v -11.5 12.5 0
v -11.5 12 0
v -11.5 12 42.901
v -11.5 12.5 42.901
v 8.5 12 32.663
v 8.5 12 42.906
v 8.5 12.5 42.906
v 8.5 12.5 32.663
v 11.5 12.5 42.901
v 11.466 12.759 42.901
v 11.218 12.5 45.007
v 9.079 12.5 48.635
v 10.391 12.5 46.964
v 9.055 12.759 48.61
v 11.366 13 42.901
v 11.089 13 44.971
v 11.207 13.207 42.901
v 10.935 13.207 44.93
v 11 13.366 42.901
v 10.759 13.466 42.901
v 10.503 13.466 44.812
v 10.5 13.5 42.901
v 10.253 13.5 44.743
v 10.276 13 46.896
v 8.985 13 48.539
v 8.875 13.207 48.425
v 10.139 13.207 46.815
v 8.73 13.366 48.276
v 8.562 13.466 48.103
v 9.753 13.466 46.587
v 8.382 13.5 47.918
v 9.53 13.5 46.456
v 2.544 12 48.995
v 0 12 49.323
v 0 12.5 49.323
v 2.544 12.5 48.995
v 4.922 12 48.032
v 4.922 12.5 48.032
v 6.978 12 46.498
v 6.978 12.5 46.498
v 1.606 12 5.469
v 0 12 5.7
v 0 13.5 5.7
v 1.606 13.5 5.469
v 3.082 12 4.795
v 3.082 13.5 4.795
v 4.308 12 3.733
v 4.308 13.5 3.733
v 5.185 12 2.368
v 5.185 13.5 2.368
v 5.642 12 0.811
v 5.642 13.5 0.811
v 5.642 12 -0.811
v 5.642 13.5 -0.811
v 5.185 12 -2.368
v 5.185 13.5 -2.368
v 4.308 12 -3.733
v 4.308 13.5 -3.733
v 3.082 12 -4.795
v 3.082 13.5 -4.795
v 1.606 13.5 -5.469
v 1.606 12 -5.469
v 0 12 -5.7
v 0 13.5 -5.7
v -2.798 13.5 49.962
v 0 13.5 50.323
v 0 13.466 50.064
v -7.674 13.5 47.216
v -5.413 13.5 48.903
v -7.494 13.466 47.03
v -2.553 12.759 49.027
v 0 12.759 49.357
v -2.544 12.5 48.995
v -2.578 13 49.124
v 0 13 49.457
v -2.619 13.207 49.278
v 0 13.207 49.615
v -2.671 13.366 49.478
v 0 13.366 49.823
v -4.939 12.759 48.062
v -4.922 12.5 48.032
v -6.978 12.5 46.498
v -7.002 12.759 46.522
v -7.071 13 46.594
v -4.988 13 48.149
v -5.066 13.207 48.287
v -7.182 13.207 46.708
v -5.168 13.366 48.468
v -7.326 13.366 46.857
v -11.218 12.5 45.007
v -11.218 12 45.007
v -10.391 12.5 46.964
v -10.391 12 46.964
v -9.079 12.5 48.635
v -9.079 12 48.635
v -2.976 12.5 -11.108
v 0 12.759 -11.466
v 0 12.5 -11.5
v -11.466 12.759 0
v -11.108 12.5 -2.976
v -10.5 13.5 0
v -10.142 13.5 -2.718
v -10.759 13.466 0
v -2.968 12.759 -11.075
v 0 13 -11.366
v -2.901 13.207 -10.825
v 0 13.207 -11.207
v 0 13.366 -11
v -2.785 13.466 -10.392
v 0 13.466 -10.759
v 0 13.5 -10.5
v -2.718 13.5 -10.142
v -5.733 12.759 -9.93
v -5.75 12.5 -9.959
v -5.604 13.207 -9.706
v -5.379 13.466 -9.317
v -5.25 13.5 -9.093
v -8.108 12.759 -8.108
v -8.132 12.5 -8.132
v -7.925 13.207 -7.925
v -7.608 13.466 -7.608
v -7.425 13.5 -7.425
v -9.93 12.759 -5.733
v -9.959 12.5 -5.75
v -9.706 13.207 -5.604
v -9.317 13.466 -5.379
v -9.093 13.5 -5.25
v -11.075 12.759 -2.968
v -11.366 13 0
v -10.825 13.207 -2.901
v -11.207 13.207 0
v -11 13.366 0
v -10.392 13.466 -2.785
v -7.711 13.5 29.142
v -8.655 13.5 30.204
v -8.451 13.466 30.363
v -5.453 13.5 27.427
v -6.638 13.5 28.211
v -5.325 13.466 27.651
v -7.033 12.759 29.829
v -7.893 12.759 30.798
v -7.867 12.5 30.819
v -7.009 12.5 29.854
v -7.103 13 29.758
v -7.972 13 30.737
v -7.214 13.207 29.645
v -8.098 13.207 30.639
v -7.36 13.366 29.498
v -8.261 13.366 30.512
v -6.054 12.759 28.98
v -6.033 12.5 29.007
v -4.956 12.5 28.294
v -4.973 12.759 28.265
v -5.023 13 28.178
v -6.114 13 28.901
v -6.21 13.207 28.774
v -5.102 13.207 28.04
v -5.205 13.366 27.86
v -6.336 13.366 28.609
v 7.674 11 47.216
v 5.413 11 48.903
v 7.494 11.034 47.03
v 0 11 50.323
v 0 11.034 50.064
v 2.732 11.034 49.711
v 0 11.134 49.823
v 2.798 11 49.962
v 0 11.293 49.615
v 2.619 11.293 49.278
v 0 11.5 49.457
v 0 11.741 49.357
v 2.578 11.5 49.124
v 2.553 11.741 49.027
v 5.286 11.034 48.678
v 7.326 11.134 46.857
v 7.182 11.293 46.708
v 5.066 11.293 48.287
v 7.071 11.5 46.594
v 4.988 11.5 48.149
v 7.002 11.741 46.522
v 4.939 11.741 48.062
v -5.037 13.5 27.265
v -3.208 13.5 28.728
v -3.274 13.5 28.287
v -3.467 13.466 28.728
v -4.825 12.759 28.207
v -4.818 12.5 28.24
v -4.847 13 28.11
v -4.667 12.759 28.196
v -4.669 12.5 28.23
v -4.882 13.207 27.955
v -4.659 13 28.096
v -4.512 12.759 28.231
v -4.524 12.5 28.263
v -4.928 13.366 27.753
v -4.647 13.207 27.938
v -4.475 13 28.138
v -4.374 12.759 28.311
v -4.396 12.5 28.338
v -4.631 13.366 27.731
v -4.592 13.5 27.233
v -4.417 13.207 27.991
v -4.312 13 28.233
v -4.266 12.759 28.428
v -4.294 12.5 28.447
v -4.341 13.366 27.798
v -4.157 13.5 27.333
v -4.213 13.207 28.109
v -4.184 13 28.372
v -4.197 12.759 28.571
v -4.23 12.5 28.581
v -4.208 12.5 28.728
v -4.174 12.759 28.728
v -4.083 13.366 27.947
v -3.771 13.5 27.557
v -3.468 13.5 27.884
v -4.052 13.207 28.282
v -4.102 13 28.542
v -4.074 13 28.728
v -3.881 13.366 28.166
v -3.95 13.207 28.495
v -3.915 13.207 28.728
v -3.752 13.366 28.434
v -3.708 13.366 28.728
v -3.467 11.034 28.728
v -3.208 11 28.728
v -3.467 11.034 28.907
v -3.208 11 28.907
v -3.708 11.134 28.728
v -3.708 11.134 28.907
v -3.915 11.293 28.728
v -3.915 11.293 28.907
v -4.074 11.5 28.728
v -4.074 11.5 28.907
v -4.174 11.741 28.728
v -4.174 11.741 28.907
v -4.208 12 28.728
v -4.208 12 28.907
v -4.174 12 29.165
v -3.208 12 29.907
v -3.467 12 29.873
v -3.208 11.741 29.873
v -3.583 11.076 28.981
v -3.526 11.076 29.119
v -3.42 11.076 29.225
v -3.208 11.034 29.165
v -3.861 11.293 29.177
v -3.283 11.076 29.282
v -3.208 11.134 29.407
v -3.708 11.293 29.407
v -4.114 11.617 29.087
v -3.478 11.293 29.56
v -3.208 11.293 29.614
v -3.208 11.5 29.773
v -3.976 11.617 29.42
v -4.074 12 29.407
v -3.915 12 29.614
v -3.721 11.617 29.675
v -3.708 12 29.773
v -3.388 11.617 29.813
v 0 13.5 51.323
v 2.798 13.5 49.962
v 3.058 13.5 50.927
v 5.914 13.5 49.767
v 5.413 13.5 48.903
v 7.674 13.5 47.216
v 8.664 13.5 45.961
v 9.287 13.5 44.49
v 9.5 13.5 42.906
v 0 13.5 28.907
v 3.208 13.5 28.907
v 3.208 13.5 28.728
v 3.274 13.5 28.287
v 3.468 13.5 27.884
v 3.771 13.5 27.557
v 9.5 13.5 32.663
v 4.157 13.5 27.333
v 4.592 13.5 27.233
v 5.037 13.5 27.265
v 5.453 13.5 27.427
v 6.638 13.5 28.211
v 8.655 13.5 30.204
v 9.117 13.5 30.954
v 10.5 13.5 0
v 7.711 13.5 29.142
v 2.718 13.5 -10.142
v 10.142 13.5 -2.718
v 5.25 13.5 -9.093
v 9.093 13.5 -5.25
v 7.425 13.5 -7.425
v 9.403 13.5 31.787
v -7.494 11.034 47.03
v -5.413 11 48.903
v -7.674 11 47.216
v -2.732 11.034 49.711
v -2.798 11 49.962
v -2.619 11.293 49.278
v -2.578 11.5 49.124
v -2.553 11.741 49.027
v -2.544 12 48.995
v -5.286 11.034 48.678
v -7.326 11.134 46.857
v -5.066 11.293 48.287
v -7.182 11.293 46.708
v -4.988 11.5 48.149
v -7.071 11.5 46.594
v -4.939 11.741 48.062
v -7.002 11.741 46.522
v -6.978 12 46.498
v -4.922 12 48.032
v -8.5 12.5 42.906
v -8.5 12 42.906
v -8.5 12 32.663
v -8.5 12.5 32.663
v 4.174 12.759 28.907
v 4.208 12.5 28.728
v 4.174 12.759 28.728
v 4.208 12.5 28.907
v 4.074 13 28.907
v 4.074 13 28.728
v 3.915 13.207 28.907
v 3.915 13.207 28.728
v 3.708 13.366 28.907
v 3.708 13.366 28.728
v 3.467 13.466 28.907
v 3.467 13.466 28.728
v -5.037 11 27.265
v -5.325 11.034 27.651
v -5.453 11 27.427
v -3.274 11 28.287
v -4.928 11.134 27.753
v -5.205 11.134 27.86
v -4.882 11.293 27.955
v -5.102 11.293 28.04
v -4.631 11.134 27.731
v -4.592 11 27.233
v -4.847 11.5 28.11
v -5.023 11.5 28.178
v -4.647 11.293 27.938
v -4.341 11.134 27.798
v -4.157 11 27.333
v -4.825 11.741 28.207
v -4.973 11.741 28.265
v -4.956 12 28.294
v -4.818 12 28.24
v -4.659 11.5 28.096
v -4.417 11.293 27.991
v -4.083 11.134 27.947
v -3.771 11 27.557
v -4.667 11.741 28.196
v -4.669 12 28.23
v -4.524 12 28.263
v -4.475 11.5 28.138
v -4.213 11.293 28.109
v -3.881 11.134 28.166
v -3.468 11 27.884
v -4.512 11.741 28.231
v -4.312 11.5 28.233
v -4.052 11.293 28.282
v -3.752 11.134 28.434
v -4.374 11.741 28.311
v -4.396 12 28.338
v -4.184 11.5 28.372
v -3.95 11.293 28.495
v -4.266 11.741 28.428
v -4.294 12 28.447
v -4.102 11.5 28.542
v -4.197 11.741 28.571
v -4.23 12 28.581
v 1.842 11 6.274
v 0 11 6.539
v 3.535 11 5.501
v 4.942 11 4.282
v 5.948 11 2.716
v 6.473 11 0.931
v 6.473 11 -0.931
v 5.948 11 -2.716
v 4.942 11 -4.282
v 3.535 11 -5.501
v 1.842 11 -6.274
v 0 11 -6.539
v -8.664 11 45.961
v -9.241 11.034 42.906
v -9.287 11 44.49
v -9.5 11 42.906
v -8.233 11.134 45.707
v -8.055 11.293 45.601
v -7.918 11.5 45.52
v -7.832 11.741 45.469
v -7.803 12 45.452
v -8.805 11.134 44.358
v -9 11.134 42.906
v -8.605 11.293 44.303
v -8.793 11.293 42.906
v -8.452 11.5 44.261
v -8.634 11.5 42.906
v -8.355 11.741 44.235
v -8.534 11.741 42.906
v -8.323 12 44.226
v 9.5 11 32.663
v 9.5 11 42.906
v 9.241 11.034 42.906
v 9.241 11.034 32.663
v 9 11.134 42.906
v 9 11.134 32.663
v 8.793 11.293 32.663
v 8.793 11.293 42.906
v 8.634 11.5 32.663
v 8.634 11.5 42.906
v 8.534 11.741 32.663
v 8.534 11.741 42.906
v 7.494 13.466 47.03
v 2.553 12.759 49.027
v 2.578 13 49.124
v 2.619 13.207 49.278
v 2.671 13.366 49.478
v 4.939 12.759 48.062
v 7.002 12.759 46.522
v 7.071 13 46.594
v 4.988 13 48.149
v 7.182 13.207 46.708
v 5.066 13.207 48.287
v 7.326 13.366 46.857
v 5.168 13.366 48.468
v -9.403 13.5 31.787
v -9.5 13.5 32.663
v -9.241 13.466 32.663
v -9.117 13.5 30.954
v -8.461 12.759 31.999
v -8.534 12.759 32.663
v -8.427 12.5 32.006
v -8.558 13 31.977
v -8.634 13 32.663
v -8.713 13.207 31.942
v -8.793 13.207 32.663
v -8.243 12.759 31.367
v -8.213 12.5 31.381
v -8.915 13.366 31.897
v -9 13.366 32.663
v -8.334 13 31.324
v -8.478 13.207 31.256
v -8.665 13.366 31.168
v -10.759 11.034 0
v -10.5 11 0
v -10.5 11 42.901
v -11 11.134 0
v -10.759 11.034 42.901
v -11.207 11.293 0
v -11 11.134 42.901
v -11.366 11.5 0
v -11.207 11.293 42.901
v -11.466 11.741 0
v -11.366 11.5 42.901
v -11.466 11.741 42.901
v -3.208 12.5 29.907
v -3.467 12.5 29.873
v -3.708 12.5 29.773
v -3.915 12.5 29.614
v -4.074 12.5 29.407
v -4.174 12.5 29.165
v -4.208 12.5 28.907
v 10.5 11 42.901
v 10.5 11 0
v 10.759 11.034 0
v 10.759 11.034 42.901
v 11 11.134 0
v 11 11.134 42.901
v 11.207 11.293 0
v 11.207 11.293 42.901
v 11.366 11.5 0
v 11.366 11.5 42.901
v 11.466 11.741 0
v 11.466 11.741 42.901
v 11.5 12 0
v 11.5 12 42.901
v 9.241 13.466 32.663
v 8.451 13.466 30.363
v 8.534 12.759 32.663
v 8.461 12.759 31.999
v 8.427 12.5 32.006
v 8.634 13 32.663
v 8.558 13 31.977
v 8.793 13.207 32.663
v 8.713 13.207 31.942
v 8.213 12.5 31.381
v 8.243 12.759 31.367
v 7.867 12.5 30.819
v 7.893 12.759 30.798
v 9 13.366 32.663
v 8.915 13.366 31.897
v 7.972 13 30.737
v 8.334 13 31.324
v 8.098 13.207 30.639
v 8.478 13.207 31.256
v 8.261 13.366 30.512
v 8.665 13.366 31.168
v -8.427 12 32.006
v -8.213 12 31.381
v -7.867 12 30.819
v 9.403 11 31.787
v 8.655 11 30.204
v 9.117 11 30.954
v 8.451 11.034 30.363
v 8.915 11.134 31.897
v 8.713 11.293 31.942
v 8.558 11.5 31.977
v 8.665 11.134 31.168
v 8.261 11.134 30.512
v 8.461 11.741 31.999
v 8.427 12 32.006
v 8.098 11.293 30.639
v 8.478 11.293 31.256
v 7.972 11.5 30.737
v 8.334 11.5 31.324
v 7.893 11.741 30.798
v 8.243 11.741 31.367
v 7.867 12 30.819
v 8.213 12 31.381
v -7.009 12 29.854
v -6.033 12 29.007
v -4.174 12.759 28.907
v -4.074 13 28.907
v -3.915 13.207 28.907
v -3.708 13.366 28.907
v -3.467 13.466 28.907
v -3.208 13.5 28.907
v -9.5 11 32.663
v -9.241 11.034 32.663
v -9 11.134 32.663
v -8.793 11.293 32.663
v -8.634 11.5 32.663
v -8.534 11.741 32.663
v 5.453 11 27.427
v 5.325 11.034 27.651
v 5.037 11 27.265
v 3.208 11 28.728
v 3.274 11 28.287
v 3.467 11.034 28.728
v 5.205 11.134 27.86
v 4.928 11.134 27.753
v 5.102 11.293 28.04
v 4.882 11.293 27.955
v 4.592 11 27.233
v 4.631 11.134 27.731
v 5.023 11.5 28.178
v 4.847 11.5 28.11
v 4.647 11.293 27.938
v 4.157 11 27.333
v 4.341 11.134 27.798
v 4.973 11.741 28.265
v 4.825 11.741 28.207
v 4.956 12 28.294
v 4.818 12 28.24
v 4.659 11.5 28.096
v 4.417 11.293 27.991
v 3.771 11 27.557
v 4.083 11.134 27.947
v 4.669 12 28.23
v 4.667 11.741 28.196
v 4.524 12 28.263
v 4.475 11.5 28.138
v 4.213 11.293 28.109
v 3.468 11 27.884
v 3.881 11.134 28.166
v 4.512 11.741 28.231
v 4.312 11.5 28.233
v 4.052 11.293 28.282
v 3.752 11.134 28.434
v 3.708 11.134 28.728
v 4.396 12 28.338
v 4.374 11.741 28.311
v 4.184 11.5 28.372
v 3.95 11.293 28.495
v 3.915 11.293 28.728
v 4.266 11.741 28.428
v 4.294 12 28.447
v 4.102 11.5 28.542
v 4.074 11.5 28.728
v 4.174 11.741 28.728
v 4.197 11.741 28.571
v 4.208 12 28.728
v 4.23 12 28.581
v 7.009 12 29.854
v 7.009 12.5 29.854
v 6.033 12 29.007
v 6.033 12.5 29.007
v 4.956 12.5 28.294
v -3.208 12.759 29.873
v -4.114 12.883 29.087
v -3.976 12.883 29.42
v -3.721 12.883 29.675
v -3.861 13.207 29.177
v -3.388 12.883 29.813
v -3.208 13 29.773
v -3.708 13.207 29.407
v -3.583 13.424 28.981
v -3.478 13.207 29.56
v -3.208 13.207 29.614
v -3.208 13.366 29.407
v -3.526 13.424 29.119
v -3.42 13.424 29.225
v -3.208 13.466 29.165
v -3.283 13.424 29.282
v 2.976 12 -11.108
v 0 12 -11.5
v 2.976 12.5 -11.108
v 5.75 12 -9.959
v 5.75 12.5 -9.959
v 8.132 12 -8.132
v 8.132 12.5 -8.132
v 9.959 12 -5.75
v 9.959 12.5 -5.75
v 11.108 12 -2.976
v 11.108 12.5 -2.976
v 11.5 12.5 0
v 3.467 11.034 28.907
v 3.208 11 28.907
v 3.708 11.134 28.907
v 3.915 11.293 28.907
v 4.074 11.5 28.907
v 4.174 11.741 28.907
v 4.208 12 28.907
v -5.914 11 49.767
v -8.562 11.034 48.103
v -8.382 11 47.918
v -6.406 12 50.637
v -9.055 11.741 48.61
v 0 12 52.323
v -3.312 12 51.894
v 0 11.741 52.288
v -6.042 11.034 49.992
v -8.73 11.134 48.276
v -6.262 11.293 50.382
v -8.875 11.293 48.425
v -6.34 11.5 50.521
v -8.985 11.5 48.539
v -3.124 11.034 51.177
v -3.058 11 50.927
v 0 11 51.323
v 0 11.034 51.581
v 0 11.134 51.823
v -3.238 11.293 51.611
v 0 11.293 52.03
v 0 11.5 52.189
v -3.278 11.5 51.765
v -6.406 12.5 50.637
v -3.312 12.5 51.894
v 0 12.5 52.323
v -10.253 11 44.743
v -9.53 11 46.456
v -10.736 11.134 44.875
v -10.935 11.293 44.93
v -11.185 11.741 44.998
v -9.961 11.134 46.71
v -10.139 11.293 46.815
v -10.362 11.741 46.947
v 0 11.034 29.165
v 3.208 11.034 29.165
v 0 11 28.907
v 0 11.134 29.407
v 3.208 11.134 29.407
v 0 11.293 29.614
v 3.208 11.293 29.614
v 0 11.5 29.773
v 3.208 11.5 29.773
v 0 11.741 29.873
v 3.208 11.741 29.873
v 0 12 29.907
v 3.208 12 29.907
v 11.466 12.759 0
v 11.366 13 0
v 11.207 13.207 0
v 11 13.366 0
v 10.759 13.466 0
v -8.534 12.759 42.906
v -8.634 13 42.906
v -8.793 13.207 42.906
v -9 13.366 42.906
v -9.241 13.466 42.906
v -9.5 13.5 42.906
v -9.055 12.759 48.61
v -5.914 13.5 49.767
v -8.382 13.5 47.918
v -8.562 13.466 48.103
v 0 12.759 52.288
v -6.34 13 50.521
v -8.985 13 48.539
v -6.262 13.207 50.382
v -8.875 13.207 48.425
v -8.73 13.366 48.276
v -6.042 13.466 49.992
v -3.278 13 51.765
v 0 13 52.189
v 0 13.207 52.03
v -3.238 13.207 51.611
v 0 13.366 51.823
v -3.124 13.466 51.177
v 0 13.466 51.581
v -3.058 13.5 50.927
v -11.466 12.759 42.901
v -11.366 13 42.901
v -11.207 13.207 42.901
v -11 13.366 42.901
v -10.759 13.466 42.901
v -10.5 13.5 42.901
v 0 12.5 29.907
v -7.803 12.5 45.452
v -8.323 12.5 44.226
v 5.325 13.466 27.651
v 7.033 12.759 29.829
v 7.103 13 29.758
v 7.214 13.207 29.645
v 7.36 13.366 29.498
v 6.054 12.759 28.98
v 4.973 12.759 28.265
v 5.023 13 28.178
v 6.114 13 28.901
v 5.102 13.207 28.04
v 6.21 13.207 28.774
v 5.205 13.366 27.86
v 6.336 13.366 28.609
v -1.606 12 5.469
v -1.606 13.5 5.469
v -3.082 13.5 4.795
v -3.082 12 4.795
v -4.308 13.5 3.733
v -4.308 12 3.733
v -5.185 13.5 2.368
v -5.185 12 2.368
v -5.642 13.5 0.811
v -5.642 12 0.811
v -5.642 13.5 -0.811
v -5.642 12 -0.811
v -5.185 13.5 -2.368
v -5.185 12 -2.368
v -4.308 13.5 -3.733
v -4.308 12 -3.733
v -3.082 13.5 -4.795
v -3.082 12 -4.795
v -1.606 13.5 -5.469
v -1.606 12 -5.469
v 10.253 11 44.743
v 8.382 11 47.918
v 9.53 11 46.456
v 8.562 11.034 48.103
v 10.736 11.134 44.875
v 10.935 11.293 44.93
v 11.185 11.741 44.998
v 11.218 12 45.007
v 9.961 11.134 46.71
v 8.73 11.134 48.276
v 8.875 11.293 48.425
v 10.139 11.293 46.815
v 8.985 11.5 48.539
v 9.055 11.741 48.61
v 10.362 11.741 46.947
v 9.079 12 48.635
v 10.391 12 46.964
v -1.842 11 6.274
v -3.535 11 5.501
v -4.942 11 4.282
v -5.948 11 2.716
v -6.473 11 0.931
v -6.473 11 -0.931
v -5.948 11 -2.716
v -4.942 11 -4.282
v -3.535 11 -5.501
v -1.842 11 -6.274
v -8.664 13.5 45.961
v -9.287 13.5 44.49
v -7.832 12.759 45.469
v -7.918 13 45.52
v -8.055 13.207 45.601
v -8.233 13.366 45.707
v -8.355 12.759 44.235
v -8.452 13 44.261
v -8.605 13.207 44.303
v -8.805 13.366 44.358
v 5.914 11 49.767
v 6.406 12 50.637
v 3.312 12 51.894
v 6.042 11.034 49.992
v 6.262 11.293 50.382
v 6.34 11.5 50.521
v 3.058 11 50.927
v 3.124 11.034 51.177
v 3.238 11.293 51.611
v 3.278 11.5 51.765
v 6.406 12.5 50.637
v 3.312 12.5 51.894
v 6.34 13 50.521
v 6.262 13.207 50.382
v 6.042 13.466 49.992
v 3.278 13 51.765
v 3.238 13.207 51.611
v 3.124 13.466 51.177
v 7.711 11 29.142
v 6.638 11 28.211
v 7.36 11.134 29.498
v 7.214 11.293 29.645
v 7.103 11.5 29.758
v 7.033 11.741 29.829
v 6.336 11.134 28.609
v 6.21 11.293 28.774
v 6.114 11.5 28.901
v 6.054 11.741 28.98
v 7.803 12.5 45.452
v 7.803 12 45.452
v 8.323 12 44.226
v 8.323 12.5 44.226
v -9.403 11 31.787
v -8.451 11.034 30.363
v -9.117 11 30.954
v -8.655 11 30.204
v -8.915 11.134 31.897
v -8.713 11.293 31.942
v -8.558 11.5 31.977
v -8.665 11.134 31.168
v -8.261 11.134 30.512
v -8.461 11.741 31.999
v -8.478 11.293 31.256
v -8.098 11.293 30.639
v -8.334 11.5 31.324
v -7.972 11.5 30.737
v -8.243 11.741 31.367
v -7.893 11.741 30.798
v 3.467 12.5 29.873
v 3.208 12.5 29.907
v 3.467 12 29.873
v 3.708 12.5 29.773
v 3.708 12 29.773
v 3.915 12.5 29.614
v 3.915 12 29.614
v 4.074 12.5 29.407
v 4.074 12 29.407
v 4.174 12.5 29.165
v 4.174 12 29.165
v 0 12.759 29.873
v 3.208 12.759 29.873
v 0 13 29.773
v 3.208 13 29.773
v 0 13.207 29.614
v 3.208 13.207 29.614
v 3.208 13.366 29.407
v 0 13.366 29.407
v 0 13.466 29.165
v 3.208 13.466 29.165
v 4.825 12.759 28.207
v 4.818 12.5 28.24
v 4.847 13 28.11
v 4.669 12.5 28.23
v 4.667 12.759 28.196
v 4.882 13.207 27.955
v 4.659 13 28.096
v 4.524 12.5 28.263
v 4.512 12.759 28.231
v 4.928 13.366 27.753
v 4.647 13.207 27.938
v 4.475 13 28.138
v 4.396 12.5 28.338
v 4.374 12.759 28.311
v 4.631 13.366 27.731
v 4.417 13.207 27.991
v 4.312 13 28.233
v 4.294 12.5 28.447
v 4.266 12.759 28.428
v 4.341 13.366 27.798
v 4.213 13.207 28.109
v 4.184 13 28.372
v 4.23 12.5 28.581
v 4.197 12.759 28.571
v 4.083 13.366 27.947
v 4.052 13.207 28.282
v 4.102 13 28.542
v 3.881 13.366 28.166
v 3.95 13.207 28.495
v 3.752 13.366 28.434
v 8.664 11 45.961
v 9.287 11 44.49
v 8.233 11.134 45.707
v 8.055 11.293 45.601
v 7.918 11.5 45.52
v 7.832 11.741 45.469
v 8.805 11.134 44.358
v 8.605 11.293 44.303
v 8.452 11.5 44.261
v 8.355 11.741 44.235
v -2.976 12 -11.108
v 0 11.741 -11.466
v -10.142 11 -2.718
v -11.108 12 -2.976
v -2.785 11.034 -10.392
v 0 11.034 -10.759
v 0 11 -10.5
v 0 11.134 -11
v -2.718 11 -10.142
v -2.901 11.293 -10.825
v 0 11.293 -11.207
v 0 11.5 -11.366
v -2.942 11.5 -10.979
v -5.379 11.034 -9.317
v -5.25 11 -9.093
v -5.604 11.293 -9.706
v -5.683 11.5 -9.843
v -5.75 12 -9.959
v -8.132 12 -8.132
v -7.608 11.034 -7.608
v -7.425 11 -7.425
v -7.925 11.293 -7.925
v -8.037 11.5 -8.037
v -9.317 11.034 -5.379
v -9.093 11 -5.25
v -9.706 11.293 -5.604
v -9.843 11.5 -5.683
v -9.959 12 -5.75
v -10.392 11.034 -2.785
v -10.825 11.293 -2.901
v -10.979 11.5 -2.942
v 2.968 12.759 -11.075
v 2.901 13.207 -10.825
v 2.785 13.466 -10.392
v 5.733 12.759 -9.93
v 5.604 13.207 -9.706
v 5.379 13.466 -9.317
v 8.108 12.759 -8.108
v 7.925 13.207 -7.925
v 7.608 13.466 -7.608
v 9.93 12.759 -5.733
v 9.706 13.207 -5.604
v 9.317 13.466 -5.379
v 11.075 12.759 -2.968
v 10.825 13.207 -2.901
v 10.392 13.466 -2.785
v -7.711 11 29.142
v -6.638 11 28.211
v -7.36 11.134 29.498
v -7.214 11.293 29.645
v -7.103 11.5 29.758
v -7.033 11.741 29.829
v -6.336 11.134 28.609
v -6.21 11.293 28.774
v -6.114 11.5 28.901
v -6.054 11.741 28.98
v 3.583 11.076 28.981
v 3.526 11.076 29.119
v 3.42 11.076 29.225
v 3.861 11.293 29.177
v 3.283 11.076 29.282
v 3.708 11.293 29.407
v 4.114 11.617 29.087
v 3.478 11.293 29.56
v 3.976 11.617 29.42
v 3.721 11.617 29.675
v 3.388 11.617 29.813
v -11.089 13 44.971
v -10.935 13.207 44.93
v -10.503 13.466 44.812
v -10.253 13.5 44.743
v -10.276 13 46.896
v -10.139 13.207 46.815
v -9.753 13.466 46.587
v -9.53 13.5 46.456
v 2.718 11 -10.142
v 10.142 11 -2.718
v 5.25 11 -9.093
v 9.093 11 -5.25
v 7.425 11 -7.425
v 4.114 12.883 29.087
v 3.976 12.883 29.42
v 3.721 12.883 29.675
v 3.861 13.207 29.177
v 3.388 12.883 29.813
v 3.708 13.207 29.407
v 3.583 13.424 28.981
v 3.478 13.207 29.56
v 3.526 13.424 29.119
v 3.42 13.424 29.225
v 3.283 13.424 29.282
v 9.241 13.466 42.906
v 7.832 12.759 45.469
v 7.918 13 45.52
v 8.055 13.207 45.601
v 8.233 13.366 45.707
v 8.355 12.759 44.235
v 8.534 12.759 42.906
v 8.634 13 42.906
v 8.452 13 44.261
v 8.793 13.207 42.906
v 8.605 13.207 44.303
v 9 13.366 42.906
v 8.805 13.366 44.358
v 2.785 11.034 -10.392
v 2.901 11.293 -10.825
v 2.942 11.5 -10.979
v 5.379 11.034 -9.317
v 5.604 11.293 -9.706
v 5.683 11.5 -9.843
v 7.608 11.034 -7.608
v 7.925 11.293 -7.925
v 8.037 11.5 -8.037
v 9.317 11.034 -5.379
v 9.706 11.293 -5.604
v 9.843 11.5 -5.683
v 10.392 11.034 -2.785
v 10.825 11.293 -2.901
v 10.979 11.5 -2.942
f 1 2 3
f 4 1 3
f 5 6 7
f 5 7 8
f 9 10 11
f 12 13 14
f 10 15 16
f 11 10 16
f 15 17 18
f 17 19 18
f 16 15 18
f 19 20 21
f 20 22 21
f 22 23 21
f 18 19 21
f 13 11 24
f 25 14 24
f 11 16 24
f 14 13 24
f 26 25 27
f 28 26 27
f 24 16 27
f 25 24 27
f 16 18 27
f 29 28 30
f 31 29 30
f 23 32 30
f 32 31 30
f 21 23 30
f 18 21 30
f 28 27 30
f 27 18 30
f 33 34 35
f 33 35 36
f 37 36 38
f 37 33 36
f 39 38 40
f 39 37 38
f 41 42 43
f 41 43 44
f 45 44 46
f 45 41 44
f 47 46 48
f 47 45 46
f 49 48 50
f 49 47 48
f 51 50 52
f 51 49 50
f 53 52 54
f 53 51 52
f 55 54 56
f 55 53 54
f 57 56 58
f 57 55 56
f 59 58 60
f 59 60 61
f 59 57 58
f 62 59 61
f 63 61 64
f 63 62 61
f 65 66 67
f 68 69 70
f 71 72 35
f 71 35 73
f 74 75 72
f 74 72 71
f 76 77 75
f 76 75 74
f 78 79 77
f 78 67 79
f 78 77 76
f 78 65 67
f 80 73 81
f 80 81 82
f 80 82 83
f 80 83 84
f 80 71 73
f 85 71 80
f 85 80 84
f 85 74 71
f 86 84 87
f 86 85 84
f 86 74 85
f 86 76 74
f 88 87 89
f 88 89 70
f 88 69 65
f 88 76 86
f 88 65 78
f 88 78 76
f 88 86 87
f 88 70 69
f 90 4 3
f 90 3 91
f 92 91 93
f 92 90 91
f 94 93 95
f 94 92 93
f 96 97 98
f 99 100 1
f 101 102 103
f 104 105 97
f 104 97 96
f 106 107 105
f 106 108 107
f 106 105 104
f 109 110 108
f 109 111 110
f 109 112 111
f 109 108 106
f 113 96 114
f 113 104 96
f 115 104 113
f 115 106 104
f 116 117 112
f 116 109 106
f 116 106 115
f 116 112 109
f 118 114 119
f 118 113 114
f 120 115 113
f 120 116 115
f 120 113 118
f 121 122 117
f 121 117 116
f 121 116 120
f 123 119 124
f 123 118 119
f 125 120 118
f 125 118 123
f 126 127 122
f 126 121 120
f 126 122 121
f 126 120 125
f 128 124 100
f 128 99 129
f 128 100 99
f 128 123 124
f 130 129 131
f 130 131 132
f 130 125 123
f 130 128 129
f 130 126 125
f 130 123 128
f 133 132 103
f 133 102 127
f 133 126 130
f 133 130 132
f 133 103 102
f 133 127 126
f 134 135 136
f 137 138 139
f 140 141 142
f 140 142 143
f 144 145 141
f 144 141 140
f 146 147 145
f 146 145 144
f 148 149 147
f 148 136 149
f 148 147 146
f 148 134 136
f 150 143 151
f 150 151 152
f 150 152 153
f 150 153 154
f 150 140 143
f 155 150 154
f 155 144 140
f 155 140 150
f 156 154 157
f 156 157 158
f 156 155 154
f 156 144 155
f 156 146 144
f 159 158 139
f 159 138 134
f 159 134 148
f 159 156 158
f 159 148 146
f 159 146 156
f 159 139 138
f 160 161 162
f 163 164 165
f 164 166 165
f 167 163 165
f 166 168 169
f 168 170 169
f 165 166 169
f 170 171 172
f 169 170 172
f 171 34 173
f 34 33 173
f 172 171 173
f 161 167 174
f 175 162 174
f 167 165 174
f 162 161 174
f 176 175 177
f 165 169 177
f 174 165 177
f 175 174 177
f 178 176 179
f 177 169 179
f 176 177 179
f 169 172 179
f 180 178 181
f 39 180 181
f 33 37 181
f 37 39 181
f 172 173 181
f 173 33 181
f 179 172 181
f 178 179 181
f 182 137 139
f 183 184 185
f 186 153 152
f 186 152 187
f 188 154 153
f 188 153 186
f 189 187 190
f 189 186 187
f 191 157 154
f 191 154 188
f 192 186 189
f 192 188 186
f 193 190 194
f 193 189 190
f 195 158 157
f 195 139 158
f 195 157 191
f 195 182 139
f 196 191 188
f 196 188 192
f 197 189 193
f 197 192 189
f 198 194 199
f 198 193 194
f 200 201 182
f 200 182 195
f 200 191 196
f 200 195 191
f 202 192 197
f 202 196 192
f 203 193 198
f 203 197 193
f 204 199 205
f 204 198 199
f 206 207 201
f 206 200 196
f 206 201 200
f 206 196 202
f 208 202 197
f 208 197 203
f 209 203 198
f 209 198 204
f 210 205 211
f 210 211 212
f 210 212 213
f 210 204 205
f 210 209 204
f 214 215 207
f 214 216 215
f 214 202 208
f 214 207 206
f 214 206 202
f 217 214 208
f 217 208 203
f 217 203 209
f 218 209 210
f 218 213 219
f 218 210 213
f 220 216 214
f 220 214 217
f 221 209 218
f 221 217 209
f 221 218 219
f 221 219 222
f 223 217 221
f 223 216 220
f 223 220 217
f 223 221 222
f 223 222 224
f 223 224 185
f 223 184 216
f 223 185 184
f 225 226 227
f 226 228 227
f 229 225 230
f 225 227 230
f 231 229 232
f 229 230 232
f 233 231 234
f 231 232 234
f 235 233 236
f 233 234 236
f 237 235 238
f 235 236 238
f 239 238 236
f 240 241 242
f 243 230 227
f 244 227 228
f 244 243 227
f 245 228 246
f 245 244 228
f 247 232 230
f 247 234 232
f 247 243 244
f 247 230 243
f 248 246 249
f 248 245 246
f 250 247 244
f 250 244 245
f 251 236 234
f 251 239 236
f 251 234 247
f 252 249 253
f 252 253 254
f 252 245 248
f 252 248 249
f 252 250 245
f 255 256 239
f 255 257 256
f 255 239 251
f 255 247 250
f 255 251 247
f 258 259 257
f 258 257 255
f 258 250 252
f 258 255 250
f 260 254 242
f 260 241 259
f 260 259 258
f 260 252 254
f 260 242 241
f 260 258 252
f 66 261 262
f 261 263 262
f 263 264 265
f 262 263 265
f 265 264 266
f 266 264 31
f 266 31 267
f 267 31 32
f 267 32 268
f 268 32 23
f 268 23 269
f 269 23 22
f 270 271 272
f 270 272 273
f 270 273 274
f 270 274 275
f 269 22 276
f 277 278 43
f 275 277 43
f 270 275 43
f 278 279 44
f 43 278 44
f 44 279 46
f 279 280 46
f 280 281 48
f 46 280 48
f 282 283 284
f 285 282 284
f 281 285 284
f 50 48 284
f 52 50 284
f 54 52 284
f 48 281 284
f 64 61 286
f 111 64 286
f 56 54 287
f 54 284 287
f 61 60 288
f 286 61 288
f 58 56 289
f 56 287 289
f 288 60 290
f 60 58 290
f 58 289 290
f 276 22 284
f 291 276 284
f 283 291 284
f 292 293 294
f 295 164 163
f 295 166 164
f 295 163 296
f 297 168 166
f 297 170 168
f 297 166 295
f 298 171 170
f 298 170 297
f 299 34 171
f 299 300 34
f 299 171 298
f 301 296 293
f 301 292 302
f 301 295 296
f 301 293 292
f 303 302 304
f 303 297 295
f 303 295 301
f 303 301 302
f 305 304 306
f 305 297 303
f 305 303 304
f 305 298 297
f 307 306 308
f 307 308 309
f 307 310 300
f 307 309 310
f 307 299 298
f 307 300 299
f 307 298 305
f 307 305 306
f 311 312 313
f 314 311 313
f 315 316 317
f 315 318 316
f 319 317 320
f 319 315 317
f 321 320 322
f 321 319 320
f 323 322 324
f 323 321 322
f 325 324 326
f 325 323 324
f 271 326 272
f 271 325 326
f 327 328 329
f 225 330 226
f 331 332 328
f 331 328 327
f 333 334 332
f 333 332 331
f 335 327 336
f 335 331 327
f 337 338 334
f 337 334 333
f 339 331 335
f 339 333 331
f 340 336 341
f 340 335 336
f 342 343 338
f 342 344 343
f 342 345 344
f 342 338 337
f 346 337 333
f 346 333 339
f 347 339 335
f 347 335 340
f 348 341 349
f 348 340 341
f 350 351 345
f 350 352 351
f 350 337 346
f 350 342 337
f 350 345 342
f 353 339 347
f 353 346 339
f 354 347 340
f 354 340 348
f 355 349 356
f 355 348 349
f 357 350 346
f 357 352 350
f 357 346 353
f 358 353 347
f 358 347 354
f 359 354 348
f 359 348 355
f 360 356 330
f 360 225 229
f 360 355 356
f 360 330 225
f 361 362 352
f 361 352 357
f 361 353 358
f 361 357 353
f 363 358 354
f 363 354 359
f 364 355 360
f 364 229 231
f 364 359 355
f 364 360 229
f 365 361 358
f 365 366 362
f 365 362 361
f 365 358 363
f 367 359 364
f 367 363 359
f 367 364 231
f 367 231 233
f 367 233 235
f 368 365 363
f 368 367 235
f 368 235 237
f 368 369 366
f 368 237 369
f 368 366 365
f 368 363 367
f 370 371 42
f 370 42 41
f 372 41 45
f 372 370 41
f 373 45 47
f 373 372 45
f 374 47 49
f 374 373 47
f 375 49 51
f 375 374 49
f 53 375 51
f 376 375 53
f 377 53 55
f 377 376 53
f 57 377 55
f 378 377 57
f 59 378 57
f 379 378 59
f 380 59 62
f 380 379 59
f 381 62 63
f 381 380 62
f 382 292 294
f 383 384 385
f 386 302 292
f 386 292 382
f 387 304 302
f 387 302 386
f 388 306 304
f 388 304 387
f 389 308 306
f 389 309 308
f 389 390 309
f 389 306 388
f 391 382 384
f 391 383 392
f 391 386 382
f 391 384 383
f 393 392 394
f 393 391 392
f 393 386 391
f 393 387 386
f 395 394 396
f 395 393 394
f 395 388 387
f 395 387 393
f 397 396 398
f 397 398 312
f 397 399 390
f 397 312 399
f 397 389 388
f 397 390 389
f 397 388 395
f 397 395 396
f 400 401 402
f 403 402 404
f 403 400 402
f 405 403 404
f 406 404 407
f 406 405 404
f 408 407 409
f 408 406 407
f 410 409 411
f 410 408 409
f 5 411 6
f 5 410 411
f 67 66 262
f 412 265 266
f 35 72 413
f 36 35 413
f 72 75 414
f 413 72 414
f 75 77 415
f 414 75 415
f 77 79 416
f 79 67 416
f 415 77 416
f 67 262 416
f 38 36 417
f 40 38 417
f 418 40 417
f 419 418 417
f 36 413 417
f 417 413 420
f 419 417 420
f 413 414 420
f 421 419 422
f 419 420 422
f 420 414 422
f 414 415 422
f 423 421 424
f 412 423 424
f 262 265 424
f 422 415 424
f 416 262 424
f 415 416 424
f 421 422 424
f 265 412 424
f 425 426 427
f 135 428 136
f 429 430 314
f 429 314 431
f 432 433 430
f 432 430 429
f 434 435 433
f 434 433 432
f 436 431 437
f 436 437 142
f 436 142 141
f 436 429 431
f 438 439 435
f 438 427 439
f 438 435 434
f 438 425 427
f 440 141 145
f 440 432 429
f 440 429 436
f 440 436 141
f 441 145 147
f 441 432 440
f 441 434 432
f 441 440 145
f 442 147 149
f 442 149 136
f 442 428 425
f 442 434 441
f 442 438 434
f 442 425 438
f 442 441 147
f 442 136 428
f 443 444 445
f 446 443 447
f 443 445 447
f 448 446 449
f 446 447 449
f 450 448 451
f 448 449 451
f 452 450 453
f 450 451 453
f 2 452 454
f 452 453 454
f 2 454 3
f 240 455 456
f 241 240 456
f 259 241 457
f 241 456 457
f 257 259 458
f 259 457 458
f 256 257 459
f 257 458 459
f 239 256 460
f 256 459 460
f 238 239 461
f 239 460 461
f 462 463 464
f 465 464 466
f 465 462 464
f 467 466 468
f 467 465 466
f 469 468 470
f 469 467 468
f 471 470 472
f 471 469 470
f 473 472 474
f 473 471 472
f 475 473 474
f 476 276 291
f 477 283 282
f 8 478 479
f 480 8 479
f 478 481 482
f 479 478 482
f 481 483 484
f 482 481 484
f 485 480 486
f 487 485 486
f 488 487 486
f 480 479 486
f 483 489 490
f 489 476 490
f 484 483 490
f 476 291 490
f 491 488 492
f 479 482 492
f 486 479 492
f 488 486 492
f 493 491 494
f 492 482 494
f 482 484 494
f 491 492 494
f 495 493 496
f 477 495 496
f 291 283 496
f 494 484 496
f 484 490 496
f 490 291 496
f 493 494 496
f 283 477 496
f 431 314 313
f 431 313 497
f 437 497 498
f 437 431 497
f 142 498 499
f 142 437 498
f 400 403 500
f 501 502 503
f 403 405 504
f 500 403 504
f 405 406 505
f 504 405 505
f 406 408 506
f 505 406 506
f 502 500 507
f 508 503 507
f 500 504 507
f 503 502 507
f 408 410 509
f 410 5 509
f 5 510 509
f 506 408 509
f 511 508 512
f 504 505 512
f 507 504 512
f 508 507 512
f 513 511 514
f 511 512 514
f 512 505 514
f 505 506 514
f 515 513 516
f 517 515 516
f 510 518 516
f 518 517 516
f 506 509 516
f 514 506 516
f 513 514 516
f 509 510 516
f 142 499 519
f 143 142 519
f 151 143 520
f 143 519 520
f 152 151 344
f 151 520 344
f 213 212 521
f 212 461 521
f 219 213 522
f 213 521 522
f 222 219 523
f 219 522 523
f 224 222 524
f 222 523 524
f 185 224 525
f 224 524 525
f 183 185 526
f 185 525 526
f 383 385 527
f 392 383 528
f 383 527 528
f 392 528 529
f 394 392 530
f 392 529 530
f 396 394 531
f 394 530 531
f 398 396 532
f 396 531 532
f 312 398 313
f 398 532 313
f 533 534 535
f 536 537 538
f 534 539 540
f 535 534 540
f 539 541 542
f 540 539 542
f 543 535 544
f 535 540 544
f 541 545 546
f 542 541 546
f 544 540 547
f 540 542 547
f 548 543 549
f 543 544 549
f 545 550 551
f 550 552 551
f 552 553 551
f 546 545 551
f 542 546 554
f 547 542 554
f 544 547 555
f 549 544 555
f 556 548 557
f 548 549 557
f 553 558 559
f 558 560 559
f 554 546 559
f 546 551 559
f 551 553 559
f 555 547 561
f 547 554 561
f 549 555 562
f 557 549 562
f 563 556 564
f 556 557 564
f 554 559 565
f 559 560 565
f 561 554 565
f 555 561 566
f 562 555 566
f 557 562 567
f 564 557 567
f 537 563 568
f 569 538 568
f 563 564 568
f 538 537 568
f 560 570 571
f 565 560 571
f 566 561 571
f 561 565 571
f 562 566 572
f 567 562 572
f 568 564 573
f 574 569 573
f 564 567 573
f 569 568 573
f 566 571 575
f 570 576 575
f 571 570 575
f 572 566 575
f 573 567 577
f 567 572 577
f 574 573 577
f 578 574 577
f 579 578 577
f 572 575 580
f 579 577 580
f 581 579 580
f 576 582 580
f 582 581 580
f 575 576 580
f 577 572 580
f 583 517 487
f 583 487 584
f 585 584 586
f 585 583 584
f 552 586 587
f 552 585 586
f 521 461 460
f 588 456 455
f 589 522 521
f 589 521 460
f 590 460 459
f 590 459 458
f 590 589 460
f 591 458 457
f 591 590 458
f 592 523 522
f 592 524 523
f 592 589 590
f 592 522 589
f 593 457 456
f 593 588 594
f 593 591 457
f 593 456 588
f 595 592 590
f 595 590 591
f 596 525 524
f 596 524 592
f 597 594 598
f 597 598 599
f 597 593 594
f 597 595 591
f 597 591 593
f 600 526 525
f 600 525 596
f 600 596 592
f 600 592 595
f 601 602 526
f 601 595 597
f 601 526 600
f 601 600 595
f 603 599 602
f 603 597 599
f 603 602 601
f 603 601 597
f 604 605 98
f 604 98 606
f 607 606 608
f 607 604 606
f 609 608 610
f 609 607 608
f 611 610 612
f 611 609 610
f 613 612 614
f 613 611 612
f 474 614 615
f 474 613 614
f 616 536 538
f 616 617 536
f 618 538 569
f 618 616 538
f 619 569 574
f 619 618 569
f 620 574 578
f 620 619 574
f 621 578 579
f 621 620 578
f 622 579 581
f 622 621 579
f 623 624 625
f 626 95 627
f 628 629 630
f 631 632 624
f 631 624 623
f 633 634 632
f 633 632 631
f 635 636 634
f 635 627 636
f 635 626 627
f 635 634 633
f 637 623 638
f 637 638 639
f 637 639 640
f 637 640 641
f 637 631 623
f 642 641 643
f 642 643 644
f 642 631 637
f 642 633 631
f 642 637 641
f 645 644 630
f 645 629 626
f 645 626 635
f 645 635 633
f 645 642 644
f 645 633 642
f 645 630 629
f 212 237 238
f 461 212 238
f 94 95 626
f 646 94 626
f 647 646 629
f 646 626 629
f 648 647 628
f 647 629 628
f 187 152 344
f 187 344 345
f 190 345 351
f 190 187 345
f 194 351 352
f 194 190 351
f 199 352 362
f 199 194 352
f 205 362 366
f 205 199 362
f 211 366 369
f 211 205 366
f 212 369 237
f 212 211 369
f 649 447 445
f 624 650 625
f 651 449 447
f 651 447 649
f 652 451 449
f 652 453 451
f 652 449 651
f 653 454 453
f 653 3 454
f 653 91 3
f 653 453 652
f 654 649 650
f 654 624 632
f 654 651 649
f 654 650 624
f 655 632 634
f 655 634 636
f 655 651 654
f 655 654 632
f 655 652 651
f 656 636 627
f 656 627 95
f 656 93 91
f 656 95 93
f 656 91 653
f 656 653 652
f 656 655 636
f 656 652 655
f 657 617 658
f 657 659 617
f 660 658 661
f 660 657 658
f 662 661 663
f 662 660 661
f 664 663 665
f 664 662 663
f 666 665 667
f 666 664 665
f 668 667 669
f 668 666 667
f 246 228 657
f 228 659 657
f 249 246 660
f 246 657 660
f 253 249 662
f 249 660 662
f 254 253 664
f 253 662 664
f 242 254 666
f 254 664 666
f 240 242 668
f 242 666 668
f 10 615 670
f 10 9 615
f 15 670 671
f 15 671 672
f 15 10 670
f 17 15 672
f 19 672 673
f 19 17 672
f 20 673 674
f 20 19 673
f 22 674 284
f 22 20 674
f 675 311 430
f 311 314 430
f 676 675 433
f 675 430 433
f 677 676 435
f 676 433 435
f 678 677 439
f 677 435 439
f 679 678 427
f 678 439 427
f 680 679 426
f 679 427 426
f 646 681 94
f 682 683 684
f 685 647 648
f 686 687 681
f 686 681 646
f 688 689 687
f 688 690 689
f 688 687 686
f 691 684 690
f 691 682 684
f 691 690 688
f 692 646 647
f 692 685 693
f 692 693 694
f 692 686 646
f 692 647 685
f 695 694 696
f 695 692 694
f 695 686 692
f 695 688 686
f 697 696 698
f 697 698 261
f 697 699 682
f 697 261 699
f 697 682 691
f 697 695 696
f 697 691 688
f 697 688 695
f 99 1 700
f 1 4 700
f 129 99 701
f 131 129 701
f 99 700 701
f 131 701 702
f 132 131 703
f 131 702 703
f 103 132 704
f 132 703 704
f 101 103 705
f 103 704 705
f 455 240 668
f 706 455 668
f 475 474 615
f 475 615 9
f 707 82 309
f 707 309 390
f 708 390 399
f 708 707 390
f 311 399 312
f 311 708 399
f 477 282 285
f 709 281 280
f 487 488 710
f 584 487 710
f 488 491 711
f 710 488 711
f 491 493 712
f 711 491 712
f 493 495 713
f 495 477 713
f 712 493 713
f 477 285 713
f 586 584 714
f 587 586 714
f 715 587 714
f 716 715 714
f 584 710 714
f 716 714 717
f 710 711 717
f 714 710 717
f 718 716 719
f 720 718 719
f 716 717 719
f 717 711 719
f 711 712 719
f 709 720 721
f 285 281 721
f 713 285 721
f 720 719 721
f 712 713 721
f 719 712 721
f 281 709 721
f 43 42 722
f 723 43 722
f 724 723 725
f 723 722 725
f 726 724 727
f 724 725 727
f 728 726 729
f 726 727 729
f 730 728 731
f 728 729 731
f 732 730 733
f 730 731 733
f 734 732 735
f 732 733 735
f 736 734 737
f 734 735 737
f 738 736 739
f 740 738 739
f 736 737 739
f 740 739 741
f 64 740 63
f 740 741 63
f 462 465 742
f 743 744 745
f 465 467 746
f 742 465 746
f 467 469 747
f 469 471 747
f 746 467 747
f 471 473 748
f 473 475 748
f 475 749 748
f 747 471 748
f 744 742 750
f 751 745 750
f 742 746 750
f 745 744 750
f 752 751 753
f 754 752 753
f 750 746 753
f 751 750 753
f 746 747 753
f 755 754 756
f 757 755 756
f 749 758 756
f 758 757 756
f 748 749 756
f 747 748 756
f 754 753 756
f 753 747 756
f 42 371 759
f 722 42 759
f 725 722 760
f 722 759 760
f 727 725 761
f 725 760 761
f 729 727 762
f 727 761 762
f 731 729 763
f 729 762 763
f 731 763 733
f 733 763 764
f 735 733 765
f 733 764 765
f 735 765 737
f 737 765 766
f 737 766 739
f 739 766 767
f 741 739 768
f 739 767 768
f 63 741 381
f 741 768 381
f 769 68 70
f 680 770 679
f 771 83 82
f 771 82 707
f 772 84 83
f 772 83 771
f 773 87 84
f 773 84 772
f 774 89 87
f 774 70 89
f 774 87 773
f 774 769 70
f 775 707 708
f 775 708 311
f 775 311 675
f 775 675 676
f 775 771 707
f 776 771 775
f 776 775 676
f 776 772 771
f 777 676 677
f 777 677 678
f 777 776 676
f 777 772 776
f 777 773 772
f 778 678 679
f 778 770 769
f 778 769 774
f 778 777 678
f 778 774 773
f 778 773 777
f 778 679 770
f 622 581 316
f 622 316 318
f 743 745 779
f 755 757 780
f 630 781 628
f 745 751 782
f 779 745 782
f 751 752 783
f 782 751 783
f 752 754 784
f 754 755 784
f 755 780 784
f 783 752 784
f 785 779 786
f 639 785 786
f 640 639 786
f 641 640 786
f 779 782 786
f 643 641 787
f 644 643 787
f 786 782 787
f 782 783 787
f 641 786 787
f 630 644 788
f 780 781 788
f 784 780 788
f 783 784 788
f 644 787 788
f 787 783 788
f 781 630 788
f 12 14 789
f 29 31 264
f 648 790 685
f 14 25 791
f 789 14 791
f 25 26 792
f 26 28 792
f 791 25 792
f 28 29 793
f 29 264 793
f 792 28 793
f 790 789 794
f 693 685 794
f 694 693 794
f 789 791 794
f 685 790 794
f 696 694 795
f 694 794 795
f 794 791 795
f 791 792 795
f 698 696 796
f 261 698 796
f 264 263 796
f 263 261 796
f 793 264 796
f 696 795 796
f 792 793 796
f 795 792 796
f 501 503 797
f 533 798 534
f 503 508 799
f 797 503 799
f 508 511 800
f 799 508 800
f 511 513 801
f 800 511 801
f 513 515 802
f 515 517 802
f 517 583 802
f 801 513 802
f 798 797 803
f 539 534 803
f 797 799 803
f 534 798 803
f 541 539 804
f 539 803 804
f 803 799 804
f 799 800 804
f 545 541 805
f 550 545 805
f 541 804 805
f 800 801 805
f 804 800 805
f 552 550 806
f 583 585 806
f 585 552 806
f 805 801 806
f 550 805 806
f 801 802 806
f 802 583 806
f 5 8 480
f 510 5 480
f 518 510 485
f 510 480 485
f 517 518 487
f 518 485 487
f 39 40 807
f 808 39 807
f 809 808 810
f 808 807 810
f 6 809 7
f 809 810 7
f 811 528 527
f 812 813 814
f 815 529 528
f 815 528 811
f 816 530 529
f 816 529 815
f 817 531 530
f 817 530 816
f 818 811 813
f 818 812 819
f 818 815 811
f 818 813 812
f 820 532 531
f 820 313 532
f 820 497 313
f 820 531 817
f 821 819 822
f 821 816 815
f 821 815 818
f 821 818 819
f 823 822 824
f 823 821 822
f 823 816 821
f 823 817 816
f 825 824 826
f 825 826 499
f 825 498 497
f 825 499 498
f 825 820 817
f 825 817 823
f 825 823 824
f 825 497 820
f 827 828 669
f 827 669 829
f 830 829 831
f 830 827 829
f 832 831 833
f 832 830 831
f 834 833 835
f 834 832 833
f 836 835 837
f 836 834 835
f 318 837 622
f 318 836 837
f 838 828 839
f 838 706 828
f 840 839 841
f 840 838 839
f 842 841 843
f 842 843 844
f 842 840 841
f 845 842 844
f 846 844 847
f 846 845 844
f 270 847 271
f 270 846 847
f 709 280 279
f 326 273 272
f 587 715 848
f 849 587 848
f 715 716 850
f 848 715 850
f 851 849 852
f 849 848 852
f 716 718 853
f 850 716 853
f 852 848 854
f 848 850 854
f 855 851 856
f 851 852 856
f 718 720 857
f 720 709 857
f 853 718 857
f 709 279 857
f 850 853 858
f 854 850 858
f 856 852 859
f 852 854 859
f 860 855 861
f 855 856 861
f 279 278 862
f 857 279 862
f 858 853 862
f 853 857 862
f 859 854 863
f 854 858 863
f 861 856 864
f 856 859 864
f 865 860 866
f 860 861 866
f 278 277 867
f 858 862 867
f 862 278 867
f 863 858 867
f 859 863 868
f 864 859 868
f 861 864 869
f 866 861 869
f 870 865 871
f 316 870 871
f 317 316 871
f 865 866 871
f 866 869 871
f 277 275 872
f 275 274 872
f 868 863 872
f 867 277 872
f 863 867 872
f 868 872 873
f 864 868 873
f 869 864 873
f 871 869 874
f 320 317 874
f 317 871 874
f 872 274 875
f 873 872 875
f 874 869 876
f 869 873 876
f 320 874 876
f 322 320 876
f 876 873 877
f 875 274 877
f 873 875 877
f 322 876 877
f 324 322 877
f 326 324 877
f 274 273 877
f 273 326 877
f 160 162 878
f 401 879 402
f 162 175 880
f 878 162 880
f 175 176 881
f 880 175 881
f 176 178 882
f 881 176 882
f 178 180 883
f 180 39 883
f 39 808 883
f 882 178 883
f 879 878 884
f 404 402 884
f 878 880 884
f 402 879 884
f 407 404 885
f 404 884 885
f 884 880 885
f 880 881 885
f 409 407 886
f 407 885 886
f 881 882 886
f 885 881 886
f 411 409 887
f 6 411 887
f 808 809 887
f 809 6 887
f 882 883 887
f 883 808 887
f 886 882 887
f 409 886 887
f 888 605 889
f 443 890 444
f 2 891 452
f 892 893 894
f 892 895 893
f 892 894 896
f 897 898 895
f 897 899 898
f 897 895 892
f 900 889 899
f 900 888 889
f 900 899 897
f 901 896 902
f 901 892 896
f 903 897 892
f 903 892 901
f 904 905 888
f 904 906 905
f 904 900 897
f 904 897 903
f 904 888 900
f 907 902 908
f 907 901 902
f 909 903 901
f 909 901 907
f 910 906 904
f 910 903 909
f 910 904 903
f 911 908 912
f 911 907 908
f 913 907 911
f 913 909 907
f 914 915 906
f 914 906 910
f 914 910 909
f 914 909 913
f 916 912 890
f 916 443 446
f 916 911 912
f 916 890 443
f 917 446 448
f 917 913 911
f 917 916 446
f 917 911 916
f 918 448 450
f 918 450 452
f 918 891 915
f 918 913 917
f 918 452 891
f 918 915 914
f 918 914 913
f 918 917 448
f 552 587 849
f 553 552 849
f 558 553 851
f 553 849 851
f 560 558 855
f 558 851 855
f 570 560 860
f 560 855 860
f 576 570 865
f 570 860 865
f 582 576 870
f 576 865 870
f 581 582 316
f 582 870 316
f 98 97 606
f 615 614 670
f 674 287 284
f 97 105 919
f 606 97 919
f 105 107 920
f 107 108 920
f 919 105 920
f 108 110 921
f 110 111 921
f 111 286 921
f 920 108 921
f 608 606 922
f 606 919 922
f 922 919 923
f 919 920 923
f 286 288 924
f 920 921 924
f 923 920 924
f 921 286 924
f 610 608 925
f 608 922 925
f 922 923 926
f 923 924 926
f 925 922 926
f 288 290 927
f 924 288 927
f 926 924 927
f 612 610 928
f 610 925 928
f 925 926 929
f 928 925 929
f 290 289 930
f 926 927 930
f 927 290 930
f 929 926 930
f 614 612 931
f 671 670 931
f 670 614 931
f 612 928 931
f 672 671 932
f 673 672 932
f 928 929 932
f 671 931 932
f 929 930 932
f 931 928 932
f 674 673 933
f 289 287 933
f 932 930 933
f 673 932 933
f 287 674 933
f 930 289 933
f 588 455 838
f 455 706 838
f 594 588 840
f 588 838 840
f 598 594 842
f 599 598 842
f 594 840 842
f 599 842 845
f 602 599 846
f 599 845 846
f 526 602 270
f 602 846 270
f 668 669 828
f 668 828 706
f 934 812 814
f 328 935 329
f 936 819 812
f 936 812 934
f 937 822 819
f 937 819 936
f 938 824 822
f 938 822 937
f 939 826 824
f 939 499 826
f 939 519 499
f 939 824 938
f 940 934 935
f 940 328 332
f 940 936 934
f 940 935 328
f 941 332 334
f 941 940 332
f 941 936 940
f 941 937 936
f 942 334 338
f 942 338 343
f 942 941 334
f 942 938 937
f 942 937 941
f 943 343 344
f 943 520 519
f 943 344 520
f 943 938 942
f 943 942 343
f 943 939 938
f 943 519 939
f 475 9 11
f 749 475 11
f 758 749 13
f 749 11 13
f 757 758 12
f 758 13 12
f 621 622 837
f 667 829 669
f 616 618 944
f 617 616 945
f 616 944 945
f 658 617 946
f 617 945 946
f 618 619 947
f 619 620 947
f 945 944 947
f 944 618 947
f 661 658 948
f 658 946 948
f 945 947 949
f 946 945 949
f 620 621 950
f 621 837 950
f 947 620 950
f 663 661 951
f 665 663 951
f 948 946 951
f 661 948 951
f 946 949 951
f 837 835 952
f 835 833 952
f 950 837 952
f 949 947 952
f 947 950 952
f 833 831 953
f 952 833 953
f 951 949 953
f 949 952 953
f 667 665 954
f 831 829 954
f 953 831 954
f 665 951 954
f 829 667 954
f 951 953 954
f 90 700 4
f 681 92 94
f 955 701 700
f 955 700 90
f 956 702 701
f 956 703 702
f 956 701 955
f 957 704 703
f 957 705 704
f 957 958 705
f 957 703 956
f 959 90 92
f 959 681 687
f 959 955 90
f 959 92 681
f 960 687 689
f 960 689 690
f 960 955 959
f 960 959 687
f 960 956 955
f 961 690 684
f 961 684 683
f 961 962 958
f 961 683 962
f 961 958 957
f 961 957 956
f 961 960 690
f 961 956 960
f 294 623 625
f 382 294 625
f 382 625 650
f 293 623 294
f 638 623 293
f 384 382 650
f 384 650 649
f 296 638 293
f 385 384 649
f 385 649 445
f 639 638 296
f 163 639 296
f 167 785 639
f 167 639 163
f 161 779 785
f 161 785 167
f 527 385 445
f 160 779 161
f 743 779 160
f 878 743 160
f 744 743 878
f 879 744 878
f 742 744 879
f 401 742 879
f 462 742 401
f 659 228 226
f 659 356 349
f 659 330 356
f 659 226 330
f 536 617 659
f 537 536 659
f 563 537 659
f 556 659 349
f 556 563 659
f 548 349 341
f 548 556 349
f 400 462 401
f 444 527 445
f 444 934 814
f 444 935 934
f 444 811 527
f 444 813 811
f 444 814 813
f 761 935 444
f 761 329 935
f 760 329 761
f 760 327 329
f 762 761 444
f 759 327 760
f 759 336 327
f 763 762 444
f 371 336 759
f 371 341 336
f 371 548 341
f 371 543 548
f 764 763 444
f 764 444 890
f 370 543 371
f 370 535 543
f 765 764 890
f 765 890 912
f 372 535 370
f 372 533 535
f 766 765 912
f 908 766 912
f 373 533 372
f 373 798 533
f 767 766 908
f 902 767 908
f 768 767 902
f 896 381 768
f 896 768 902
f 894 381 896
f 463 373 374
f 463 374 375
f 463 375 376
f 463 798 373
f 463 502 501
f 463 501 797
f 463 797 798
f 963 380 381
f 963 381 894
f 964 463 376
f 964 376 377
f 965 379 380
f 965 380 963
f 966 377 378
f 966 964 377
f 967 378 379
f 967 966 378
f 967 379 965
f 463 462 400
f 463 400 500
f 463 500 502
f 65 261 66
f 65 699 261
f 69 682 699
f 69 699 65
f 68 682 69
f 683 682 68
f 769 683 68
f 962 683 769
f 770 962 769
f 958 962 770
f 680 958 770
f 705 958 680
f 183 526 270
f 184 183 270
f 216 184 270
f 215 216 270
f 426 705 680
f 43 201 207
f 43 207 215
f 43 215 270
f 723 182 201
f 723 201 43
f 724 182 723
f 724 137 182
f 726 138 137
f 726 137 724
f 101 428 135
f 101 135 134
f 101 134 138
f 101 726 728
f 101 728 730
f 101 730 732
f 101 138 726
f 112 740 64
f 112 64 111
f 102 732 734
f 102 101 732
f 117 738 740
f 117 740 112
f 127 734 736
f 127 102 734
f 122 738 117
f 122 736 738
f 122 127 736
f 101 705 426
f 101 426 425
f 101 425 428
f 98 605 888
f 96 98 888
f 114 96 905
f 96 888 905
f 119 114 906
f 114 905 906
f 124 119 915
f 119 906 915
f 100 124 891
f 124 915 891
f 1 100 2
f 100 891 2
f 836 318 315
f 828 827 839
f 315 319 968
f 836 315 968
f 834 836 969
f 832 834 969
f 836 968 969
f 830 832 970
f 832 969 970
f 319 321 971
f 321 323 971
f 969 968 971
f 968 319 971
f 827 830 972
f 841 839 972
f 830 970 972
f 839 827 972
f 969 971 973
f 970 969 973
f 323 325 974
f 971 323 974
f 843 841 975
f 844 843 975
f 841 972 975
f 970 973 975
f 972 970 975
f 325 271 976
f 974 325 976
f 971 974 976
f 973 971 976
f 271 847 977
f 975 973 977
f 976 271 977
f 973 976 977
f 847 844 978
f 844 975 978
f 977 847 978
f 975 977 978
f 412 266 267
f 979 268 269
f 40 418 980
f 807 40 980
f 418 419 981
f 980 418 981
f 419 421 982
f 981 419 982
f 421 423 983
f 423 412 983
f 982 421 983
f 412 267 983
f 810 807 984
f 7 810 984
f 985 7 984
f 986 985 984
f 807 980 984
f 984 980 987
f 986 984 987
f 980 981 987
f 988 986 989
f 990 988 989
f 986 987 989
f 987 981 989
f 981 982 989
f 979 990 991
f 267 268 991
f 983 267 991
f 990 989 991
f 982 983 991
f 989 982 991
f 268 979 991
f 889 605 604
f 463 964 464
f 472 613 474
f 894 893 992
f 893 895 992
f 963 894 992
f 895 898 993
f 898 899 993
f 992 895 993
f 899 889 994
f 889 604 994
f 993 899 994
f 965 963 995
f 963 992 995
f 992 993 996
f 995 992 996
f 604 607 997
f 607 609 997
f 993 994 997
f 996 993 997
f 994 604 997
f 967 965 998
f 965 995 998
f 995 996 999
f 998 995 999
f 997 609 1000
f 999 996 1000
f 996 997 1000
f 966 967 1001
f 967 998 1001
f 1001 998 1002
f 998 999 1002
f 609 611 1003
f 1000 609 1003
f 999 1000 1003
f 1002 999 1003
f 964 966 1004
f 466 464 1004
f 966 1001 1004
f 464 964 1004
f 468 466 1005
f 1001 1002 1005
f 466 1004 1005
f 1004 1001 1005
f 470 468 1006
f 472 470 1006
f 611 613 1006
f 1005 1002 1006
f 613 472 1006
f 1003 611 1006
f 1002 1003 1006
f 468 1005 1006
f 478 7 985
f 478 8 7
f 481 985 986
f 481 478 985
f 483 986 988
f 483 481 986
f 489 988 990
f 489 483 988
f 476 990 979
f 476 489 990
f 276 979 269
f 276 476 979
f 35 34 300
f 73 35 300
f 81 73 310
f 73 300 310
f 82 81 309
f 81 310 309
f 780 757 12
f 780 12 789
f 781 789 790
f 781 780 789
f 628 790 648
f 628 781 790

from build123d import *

# Parameters (mm, degrees)
BOSS_EXTRUDE1_DEPTH = 2.5
CUT_EXTRUDE1_DEPTH  = 10
FILLET1_R           = 1
FILLET2_R           = 8
FILLET3_R           = 5
FILLET4_R           = 3
FILLET5_R           = 0.5
FILLET6_R           = 1
FILLET7_R           = 1
CHAMFER1_SIZE       = 1
CHAMFER1_SIZE2      = 0.839099631


with BuildPart() as part:
    # Sketch3 → Boss-Extrude1 (new body)
    with BuildSketch(Plane(origin=(0, 11, 0), x_dir=(0, 0, 1), z_dir=(0, -1, 0))):
        with BuildLine():
            Line((-5.7, 0), (-12.000001825, 0))
            Line((-12.000001825, 0), (-12.000001825, 11.5))
            Line((-12.000001825, 11.5), (45.406310527, 11.5))
            ThreePointArc((45.406310527, 11.5), (50.46030749, 6.709778353), (52.322559669, 0))
            Line((52.322559669, 0), (49.322559669, 0))
            ThreePointArc((49.322559669, 0), (48.068036881, 4.857481326), (44.618252316, 8.499999508))
            Line((44.618252316, 8.499999508), (31.732809444, 8.499999508))
            ThreePointArc((31.732809444, 8.499999508), (29.503647996, 6.63570395), (27.906627074, 4.207889529))
            Line((27.906627074, 4.207889529), (29.906623676, 4.207889529))
            Line((29.906623676, 4.207889529), (29.906623676, 0))
            Line((29.906623676, 0), (5.7, 0))
            ThreePointArc((5.7, 0), (0, 5.7), (-5.7, 0))
        make_face()
    extrude(amount=-BOSS_EXTRUDE1_DEPTH)

    # Sketch5 → Cut-Extrude1 (cut)
    with BuildSketch(Plane(origin=(0, 11, 0), x_dir=(0, 0, 1), z_dir=(0, -1, 0))):
        with BuildLine():
            Line((0, 11.5), (0, 20.081542109))
            Line((0, 20.081542109), (-17.206571574, 20.081542109))
            Line((-17.206571574, 20.081542109), (-17.206571574, -3.325861619))
            Line((-17.206571574, -3.325861619), (-11.00857141, -3.325861619))
            ThreePointArc((-11.00857141, -3.325861619), (-9.23302249, 6.855749098), (0, 11.5))
        make_face()
    extrude(amount=-CUT_EXTRUDE1_DEPTH, mode=Mode.SUBTRACT)

    # Fillet1
    fillet1_edges = [part.edges().sort_by_distance(p)[0] for p in [
        (-4.207889529, 12.25, 29.906623676),
    ]]
    fillet(fillet1_edges, radius=FILLET1_R)

    # Fillet2
    fillet2_edges = [part.edges().sort_by_distance(p)[0] for p in [
        (-11.5, 12.25, 45.406310527),
    ]]
    fillet(fillet2_edges, radius=FILLET2_R)

    # Fillet3
    fillet3_edges = [part.edges().sort_by_distance(p)[0] for p in [
        (-8.499999508, 12.25, 44.618252316),
    ]]
    fillet(fillet3_edges, radius=FILLET3_R)

    # Fillet4
    fillet4_edges = [part.edges().sort_by_distance(p)[0] for p in [
        (-8.499999508, 12.25, 31.732809444),
    ]]
    fillet(fillet4_edges, radius=FILLET4_R)

    # Fillet5
    fillet5_edges = [part.edges().sort_by_distance(p)[0] for p in [
        (-4.207889529, 12.25, 27.906627074),
    ]]
    fillet(fillet5_edges, radius=FILLET5_R)

    # Fillet6
    fillet6_edges = [part.edges().sort_by_distance(p)[0] for p in [
        (-4.899665378, 11, 51.36538086),
        (-8.131727984, 11, -8.131727984),
        (-4.899665378, 13.5, 51.36538086),
        (-8.131727984, 13.5, -8.131727984),
        (-11.5, 11, 21.45040417),
        (-10.869902111, 11, 46.012808159),
        (-11.5, 13.5, 21.45040417),
        (-10.869902111, 13.5, 46.012808159),
    ]]
    fillet(fillet6_edges, radius=FILLET6_R)

    # Fillet7
    fillet7_edges = [part.edges().sort_by_distance(p)[0] for p in [
        (-1.603944764, 13.5, 29.906623676),
        (-1.603944764, 11, 29.906623676),
        (-4.207889529, 11, 28.817398931),
        (-3.91499631, 11, 29.613730457),
        (-4.207889529, 13.5, 28.817398931),
        (-3.91499631, 13.5, 29.613730457),
        (-3.764181528, 11, 48.589533472),
        (-3.764181528, 13.5, 48.589533472),
        (-8.103866337, 11, 44.856156934),
        (-8.103866337, 13.5, 44.856156934),
        (-8.499999508, 13.5, 37.784126486),
        (-8.499999508, 11, 37.784126486),
        (-8.337232062, 11, 31.68784918),
        (-8.337232062, 13.5, 31.68784918),
        (-6.534576313, 13.5, 29.414716402),
        (-6.534576313, 11, 29.414716402),
        (-4.457147388, 11, 28.295590808),
        (-4.457147388, 13.5, 28.295590808),
    ]]
    fillet(fillet7_edges, radius=FILLET7_R)

    # Chamfer1
    chamfer1_edges = [part.edges().sort_by_distance(p)[0] for p in [
        (-5.7, 11, 0),
    ]]
    chamfer1_side = [part.faces().sort_by_distance(p)[0] for p in [
        (-5.7, 12.25, 0),
    ]]
    chamfer(chamfer1_edges, length=CHAMFER1_SIZE, length2=CHAMFER1_SIZE2, reference=chamfer1_side[0])

    # Mirror1: part across plane


with BuildPart() as part_1:
    add(part.part)
    add(part.part.mirror(Plane(origin=(0, 0, 0), x_dir=(0, 0, 1), z_dir=(1, 0, 0))))


solid = part_1.part
